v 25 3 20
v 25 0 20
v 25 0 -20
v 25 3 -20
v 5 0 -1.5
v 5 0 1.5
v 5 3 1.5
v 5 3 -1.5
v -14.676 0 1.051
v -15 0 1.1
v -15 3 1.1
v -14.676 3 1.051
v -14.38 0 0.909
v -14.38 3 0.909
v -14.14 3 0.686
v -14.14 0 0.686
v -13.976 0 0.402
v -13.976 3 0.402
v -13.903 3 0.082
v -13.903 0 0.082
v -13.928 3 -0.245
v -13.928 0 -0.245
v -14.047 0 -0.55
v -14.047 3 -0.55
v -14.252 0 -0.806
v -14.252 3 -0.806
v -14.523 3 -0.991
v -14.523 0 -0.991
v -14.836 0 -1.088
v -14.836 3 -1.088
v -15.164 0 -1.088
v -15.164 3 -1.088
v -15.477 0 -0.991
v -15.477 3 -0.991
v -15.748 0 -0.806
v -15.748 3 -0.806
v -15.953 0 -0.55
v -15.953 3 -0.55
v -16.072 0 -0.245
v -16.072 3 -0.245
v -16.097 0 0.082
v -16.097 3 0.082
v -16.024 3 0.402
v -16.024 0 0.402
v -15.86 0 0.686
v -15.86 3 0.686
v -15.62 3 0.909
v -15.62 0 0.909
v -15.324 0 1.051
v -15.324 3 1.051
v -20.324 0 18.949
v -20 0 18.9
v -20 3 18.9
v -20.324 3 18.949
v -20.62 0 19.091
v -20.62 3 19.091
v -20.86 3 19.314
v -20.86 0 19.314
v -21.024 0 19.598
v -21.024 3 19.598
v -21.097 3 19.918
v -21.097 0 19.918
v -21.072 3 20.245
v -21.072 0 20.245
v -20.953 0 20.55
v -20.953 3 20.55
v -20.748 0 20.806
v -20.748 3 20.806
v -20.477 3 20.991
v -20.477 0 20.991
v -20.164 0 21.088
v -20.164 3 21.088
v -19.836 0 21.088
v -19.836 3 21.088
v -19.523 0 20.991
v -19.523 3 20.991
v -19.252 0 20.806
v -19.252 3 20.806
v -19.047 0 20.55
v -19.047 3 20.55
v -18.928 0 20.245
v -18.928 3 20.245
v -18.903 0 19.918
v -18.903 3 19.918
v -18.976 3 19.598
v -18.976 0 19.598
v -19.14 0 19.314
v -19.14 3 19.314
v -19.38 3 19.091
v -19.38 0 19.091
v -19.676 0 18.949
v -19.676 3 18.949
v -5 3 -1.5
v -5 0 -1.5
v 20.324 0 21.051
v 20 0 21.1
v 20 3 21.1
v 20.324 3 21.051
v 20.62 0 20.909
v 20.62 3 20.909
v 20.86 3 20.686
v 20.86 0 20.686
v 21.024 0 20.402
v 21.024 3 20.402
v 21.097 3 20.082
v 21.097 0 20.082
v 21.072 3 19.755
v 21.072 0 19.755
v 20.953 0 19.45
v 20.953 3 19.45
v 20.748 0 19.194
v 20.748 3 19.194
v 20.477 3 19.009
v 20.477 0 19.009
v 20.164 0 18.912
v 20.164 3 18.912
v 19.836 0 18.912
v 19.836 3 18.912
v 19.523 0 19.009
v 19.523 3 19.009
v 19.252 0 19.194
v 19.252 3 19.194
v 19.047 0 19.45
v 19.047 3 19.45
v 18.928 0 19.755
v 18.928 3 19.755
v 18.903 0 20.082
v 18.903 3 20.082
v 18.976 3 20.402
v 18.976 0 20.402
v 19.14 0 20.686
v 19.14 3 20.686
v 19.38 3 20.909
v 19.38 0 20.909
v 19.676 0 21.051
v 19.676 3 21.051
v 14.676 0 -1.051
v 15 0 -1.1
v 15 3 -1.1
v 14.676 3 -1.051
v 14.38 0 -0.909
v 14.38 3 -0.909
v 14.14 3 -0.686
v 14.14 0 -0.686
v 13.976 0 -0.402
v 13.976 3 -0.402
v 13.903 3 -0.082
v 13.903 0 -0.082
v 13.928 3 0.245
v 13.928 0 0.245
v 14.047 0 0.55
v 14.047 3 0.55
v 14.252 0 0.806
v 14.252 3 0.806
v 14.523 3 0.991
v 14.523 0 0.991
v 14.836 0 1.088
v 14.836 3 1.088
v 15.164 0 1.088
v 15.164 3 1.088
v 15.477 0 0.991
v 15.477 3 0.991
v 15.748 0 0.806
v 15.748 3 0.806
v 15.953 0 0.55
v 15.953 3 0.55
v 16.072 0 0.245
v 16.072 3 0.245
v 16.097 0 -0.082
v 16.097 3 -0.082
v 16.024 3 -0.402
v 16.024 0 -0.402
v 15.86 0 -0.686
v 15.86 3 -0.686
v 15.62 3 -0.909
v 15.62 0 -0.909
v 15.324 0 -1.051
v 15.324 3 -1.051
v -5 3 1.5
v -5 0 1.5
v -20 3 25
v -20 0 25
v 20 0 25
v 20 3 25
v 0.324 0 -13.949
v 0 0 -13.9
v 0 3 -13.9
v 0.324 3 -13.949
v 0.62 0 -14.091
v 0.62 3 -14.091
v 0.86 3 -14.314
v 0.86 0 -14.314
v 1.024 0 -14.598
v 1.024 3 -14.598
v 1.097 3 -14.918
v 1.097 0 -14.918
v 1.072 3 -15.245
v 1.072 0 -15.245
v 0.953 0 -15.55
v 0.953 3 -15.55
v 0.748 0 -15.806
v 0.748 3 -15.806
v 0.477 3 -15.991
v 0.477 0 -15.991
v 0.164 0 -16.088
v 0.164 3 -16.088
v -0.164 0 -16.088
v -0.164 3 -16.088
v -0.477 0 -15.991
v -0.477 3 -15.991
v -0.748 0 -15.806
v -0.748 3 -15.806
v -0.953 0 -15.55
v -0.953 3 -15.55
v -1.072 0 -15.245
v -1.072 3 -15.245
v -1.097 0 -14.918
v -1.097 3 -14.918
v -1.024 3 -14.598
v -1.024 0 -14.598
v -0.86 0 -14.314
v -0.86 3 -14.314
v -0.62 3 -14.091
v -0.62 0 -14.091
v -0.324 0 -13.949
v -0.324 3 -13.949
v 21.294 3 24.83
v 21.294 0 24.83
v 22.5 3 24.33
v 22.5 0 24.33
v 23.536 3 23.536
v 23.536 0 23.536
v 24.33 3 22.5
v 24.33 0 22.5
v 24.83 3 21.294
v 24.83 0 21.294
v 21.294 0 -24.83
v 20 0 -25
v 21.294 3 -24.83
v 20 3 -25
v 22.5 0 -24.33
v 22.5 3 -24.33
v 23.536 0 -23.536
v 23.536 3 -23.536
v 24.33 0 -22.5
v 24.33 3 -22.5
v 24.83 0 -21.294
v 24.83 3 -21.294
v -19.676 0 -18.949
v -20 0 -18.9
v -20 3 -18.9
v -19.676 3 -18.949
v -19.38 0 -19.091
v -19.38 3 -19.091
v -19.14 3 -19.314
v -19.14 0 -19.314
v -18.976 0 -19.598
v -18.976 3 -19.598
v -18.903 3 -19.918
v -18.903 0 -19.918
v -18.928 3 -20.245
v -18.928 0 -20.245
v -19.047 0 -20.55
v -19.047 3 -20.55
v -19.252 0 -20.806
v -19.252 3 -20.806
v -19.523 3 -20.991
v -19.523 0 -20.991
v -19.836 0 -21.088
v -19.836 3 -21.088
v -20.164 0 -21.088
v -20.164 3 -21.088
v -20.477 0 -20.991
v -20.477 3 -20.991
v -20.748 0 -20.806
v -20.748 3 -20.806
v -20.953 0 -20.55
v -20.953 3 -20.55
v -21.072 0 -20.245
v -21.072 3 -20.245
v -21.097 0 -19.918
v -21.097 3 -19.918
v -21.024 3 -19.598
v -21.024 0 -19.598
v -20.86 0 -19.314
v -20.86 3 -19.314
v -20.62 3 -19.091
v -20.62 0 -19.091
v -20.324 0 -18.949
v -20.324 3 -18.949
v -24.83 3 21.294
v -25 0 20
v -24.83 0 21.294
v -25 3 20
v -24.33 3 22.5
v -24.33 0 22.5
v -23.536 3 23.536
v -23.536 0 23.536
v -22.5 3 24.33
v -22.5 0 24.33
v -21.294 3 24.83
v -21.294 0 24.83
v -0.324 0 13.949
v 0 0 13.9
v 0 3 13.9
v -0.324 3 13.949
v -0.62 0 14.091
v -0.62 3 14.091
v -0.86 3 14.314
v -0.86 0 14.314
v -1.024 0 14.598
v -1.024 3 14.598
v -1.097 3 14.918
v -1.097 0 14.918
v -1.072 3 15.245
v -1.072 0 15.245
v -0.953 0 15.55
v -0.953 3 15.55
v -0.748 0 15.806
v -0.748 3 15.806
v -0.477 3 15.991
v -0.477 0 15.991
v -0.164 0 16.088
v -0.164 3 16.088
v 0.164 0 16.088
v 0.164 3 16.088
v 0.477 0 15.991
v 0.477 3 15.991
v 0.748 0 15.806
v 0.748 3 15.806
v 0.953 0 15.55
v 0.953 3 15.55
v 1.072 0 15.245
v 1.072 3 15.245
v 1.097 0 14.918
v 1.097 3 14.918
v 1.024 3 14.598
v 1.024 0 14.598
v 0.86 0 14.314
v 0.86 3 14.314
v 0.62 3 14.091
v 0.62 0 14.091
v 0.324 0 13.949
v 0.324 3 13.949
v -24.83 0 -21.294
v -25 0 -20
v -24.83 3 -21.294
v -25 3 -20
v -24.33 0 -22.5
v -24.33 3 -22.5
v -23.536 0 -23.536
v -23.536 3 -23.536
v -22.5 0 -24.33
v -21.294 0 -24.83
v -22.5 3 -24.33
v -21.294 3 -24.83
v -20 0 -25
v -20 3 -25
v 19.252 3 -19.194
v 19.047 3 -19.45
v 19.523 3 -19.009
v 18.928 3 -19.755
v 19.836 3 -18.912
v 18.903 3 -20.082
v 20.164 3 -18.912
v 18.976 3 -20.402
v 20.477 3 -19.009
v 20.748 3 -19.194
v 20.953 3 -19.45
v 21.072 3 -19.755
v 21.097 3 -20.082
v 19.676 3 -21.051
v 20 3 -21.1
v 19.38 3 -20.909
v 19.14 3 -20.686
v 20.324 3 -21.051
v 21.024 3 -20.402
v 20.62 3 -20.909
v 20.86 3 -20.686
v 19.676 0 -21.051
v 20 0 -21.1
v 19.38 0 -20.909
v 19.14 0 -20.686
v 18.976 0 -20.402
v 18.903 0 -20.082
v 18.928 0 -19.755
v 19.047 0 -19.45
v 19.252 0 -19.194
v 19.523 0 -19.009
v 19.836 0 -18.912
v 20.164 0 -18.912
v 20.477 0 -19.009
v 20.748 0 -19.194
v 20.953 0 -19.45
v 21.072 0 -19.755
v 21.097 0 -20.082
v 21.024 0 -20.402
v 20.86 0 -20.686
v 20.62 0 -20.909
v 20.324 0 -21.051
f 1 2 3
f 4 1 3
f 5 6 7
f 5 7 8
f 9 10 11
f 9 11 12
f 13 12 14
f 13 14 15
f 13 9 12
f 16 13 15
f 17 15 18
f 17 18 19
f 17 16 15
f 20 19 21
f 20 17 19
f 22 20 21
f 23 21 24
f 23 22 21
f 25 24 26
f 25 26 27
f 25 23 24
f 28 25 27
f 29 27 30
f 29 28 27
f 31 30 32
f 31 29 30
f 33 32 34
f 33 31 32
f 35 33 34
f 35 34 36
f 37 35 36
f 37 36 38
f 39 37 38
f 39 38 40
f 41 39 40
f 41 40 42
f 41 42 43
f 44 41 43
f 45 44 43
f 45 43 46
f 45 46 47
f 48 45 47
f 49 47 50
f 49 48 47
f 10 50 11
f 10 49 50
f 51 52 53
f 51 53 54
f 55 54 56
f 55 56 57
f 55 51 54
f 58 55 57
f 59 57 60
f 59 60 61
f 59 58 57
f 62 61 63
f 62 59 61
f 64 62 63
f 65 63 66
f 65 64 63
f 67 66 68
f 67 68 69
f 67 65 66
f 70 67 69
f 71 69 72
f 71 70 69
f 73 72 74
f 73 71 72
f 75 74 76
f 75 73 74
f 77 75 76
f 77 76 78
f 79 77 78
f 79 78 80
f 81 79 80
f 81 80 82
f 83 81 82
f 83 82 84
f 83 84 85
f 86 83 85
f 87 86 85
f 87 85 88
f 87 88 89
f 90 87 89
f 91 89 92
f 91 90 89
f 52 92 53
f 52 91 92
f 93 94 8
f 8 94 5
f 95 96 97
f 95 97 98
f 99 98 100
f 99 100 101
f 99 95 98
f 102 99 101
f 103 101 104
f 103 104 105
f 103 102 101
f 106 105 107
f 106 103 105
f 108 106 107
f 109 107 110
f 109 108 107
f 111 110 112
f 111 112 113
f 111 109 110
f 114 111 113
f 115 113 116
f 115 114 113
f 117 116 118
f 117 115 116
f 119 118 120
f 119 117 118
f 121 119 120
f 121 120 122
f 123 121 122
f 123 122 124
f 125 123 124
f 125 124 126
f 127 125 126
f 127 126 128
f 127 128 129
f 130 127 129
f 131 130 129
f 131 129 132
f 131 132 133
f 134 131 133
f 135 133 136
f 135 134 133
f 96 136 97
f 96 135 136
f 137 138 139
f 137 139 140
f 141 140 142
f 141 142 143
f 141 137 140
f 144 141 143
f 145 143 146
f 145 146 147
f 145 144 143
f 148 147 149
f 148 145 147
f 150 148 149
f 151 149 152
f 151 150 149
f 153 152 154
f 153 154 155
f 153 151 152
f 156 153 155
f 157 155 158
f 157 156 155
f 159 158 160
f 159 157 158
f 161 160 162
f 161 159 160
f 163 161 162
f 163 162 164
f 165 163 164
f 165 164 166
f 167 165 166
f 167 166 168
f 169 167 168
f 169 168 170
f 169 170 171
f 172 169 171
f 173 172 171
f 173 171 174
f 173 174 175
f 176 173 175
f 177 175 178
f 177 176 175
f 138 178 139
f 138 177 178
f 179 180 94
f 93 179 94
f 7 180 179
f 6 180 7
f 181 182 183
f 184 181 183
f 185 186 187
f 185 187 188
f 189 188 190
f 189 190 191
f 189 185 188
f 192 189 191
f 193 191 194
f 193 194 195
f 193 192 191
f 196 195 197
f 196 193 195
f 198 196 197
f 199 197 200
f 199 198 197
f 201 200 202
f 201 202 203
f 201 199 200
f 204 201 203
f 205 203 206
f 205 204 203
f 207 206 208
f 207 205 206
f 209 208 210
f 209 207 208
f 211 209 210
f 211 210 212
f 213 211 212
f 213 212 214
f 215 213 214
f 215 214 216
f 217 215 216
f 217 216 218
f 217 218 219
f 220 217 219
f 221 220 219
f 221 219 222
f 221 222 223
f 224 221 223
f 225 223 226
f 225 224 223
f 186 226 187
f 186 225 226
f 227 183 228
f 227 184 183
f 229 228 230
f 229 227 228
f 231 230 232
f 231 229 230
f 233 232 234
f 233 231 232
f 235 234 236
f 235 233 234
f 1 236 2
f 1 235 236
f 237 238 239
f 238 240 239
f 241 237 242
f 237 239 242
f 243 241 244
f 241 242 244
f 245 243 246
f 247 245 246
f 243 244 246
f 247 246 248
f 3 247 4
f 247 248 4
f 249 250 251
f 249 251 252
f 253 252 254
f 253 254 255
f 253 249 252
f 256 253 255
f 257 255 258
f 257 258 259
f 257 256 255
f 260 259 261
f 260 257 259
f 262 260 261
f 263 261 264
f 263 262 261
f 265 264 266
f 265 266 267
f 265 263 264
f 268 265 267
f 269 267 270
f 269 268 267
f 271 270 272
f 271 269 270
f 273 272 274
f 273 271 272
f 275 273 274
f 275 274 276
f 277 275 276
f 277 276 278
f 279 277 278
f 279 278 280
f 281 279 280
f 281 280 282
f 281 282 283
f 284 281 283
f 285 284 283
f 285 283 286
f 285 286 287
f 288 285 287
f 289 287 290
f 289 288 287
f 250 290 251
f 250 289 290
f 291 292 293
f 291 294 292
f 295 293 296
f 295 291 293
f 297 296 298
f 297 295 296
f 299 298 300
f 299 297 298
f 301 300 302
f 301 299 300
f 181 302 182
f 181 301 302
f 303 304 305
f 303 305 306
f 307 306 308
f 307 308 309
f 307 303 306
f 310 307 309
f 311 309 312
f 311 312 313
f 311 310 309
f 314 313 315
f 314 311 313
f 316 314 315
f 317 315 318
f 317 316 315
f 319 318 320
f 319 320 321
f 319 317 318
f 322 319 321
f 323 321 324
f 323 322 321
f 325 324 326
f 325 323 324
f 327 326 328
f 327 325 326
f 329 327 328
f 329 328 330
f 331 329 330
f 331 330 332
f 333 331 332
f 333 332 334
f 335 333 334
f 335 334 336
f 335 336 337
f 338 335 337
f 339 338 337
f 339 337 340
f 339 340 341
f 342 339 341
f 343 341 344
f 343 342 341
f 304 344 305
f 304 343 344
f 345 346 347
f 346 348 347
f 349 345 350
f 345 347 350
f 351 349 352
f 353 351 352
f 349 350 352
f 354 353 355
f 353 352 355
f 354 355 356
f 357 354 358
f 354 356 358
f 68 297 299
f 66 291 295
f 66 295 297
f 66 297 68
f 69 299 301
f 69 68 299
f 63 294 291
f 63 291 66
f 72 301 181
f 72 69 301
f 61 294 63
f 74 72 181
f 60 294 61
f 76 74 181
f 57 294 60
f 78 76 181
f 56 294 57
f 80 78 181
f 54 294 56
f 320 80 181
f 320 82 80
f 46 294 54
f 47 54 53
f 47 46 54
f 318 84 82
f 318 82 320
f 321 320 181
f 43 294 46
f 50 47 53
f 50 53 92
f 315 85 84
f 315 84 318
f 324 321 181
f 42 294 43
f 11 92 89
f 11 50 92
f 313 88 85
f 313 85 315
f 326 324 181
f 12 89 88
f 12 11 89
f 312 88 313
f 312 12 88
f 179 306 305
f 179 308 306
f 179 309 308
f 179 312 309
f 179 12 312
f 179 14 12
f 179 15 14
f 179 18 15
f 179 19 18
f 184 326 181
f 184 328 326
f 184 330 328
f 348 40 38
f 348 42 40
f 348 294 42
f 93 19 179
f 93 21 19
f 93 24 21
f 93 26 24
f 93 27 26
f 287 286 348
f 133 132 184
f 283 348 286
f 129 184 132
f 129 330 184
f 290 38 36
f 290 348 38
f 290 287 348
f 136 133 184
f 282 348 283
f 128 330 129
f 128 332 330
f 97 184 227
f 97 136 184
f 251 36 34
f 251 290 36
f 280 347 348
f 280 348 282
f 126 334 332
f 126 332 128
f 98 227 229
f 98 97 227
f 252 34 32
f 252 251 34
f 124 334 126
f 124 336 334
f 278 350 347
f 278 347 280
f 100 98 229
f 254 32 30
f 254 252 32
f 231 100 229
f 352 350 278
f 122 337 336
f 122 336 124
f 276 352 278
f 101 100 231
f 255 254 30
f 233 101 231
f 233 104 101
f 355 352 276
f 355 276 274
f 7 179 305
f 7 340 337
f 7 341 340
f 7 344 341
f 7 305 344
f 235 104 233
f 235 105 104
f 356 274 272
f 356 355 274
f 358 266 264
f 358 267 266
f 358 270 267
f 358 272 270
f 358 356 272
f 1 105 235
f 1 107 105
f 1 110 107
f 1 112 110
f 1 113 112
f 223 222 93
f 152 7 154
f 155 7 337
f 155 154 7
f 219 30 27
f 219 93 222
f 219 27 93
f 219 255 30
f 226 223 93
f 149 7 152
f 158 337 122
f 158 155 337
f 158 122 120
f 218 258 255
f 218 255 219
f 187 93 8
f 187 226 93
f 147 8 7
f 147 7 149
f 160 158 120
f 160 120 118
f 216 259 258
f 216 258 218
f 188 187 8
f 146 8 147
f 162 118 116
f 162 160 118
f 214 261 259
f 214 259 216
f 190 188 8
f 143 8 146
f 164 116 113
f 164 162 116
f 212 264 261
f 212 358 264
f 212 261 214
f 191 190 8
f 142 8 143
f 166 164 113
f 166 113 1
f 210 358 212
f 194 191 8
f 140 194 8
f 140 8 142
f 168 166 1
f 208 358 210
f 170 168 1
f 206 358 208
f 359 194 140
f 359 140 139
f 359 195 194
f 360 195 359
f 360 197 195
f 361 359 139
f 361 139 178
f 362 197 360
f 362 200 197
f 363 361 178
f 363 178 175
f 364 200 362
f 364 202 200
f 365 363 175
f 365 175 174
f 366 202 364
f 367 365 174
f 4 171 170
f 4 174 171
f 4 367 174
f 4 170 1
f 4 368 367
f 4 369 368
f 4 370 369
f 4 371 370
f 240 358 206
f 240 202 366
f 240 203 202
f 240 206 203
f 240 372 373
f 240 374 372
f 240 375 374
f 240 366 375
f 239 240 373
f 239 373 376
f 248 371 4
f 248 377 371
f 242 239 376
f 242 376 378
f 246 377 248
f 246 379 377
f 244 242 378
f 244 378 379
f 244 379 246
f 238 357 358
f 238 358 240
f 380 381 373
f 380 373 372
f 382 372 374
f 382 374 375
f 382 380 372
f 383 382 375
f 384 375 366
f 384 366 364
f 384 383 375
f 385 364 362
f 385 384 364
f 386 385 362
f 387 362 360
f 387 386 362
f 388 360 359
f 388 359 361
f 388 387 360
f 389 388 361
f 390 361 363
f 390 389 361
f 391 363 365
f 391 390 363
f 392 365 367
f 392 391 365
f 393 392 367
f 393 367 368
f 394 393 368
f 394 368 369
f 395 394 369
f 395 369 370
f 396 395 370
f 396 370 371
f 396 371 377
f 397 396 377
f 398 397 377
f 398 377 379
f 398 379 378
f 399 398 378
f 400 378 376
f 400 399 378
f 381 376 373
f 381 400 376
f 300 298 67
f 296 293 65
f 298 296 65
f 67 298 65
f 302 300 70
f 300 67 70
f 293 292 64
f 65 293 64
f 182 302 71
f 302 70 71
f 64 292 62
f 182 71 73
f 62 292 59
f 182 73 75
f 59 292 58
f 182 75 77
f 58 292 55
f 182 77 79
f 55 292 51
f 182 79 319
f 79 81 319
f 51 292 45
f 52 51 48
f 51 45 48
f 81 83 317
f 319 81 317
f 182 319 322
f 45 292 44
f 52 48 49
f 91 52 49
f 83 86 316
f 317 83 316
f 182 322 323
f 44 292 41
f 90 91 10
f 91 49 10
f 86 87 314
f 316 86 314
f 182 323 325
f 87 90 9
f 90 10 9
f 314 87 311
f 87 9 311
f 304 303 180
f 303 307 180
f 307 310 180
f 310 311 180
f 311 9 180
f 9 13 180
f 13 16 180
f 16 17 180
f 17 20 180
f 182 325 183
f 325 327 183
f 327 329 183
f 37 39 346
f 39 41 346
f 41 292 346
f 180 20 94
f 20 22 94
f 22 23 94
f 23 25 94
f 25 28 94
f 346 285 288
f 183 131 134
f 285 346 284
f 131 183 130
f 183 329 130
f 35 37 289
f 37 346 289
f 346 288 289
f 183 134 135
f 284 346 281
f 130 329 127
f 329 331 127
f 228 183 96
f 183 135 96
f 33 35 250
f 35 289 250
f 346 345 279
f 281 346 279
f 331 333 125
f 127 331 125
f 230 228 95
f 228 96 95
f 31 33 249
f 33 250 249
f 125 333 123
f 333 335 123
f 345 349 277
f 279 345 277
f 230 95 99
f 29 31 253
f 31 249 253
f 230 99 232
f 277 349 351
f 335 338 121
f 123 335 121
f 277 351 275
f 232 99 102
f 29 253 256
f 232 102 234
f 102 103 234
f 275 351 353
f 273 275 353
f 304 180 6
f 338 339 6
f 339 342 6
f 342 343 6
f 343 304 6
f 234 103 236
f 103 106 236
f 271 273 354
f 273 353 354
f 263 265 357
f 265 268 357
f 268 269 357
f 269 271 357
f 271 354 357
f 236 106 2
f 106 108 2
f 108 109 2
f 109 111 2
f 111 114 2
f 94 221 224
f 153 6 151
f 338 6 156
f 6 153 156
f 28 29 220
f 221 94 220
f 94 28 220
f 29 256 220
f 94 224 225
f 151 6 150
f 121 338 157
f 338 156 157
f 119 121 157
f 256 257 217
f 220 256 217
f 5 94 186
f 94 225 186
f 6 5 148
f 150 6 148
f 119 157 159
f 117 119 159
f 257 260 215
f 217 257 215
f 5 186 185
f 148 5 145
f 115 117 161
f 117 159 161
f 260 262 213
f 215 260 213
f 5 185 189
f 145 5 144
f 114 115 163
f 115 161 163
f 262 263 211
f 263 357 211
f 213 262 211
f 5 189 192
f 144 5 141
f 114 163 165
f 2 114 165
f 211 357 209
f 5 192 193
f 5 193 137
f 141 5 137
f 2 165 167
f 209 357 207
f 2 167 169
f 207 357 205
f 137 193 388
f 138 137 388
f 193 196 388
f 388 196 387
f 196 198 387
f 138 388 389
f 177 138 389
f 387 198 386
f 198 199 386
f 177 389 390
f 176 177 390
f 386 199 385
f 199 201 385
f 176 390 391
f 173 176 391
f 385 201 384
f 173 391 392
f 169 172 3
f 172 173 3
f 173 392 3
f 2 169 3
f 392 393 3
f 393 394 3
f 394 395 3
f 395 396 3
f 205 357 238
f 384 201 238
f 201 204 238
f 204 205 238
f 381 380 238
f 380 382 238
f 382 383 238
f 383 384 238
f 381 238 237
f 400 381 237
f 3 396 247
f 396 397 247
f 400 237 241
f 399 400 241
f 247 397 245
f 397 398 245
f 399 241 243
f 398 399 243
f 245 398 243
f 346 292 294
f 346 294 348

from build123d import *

# Parameters (mm, degrees)
SKETCH1_W           = 50
SKETCH1_H           = 50
SKETCH1_R           = 1.1
SKETCH1_W_2         = 10
SKETCH1_H_2         = 3
BOSS_EXTRUDE1_DEPTH = 3
FILLET1_R           = 5


with BuildPart() as part:
    # Sketch1 → Boss-Extrude1 (new body)
    with BuildSketch(Plane(origin=(0, 0, 0), x_dir=(1, 0, 0), z_dir=(0, 1, 0))):
        Rectangle(SKETCH1_W, SKETCH1_H)
        with Locations(Location((-15, 0, 0), (0, 0, 270))):
            Circle(SKETCH1_R, mode=Mode.SUBTRACT)
        with Locations(Location((15, 0, 0), (0, 0, 90))):
            Circle(SKETCH1_R, mode=Mode.SUBTRACT)
        with Locations(Location((-20, 20, 0), (0, 0, 270))):
            Circle(SKETCH1_R, mode=Mode.SUBTRACT)
        with Locations(Location((20, 20, 0), (0, 0, 90))):
            Circle(SKETCH1_R, mode=Mode.SUBTRACT)
        with Locations(Location((20, -20, 0), (0, 0, 270))):
            Circle(SKETCH1_R, mode=Mode.SUBTRACT)
        with Locations(Location((-20, -20, 0), (0, 0, 90))):
            Circle(SKETCH1_R, mode=Mode.SUBTRACT)
        with Locations(Location((0, 15, 0), (0, 0, 270))):
            Circle(SKETCH1_R, mode=Mode.SUBTRACT)
        with Locations(Location((0, -15, 0), (0, 0, 90))):
            Circle(SKETCH1_R, mode=Mode.SUBTRACT)
        Rectangle(SKETCH1_W_2, SKETCH1_H_2, mode=Mode.SUBTRACT)
    extrude(amount=BOSS_EXTRUDE1_DEPTH)

    # Fillet1
    fillet1_edges = [part.edges().sort_by_distance(p)[0] for p in [
        (25, 1.5, 25),
        (-25, 1.5, 25),
        (-25, 1.5, -25),
        (25, 1.5, -25),
    ]]
    fillet(fillet1_edges, radius=FILLET1_R)


solid = part.part
